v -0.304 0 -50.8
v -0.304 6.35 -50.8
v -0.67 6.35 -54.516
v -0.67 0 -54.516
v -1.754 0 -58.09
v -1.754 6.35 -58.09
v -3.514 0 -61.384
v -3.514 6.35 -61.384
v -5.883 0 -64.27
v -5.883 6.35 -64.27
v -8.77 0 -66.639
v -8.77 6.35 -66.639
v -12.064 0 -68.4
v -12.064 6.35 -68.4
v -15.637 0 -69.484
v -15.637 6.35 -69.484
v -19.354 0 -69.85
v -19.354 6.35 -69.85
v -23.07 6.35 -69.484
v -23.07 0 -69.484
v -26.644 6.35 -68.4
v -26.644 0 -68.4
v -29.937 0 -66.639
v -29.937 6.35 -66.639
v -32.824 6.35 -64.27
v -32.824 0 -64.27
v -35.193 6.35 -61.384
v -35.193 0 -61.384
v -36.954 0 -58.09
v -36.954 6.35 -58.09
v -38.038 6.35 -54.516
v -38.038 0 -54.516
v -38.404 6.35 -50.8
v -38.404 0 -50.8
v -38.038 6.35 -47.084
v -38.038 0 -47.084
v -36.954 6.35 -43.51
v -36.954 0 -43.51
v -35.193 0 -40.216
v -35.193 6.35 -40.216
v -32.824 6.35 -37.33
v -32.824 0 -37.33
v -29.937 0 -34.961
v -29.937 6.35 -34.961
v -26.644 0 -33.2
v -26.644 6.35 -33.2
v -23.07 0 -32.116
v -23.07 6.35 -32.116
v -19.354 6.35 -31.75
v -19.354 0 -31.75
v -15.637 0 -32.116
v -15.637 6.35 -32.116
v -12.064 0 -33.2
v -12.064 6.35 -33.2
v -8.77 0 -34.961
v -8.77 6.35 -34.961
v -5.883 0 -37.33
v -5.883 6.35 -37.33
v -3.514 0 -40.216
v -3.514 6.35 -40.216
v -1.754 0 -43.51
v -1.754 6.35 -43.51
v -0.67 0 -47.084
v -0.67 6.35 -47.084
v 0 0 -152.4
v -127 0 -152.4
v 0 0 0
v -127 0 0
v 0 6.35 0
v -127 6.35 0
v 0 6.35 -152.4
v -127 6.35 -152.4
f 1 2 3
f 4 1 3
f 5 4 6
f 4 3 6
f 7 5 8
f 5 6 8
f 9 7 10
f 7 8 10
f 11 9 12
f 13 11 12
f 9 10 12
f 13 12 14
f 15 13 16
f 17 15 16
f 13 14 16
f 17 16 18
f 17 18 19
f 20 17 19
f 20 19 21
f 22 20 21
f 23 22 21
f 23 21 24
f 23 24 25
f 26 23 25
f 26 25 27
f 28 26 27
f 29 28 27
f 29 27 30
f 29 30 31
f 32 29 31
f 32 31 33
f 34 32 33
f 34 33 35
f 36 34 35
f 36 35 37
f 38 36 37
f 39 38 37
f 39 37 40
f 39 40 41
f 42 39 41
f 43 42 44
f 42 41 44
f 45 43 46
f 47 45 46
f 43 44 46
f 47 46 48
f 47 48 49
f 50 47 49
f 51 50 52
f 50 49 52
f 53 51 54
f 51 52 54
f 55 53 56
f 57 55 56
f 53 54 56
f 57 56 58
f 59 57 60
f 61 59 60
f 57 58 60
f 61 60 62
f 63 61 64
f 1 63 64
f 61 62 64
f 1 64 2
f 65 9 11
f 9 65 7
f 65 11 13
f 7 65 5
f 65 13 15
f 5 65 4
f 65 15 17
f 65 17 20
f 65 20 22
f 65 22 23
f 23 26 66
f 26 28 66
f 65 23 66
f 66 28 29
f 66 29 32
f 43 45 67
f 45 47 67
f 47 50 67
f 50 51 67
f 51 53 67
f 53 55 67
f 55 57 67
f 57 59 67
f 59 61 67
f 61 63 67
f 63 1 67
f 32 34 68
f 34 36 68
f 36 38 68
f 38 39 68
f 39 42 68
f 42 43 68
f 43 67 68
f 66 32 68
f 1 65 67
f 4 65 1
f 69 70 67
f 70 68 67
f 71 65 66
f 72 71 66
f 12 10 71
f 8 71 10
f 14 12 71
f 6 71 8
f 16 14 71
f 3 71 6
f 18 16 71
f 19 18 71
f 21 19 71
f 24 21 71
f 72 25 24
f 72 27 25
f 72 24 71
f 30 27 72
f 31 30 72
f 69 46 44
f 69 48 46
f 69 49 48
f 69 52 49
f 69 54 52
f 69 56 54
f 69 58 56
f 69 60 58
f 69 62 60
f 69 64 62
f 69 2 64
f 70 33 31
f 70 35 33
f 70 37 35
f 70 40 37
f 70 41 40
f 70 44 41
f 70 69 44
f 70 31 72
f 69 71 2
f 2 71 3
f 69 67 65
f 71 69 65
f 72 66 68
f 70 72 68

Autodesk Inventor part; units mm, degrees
ref_plane "YZ Plane" through (0, 0, 0) normal (1, 0, 0) x (0, 1, 0)
ref_plane "XZ Plane" through (0, 0, 0) normal (0, 1, 0) x (-1, 0, 0)
ref_plane "XY Plane" through (0, 0, 0) normal (0, 0, 1) x (1, 0, 0)
sketch "Sketch1" plane through (0, 0, 0) normal (0, 1, 0) x (-1, 0, 0)
  line L0 (0, 0) -> (0, -152.4)
  line L1 (0, -152.4) -> (127, -152.4)
  line L2 (127, -152.4) -> (127, 0)
  line L3 (127, 0) -> (0, 0)
  dimension "d0" = 152.4
  dimension "d1" = 127
extrude "Extrusion1" add sketch "Sketch1" along normal blind 6.35
sketch "Sketch2" plane through (0, 6.35, 0) normal (0, 1, 0) x (1, 0, 0)
  circle A0 centre (-19.3538, 50.8) radius 19.05
  point P0 (0, 0)
  dimension "d5" = 38.1
extrude "Extrusion2" cut sketch "Sketch2" against normal blind 6.35
properties part number "Side_chasis"
